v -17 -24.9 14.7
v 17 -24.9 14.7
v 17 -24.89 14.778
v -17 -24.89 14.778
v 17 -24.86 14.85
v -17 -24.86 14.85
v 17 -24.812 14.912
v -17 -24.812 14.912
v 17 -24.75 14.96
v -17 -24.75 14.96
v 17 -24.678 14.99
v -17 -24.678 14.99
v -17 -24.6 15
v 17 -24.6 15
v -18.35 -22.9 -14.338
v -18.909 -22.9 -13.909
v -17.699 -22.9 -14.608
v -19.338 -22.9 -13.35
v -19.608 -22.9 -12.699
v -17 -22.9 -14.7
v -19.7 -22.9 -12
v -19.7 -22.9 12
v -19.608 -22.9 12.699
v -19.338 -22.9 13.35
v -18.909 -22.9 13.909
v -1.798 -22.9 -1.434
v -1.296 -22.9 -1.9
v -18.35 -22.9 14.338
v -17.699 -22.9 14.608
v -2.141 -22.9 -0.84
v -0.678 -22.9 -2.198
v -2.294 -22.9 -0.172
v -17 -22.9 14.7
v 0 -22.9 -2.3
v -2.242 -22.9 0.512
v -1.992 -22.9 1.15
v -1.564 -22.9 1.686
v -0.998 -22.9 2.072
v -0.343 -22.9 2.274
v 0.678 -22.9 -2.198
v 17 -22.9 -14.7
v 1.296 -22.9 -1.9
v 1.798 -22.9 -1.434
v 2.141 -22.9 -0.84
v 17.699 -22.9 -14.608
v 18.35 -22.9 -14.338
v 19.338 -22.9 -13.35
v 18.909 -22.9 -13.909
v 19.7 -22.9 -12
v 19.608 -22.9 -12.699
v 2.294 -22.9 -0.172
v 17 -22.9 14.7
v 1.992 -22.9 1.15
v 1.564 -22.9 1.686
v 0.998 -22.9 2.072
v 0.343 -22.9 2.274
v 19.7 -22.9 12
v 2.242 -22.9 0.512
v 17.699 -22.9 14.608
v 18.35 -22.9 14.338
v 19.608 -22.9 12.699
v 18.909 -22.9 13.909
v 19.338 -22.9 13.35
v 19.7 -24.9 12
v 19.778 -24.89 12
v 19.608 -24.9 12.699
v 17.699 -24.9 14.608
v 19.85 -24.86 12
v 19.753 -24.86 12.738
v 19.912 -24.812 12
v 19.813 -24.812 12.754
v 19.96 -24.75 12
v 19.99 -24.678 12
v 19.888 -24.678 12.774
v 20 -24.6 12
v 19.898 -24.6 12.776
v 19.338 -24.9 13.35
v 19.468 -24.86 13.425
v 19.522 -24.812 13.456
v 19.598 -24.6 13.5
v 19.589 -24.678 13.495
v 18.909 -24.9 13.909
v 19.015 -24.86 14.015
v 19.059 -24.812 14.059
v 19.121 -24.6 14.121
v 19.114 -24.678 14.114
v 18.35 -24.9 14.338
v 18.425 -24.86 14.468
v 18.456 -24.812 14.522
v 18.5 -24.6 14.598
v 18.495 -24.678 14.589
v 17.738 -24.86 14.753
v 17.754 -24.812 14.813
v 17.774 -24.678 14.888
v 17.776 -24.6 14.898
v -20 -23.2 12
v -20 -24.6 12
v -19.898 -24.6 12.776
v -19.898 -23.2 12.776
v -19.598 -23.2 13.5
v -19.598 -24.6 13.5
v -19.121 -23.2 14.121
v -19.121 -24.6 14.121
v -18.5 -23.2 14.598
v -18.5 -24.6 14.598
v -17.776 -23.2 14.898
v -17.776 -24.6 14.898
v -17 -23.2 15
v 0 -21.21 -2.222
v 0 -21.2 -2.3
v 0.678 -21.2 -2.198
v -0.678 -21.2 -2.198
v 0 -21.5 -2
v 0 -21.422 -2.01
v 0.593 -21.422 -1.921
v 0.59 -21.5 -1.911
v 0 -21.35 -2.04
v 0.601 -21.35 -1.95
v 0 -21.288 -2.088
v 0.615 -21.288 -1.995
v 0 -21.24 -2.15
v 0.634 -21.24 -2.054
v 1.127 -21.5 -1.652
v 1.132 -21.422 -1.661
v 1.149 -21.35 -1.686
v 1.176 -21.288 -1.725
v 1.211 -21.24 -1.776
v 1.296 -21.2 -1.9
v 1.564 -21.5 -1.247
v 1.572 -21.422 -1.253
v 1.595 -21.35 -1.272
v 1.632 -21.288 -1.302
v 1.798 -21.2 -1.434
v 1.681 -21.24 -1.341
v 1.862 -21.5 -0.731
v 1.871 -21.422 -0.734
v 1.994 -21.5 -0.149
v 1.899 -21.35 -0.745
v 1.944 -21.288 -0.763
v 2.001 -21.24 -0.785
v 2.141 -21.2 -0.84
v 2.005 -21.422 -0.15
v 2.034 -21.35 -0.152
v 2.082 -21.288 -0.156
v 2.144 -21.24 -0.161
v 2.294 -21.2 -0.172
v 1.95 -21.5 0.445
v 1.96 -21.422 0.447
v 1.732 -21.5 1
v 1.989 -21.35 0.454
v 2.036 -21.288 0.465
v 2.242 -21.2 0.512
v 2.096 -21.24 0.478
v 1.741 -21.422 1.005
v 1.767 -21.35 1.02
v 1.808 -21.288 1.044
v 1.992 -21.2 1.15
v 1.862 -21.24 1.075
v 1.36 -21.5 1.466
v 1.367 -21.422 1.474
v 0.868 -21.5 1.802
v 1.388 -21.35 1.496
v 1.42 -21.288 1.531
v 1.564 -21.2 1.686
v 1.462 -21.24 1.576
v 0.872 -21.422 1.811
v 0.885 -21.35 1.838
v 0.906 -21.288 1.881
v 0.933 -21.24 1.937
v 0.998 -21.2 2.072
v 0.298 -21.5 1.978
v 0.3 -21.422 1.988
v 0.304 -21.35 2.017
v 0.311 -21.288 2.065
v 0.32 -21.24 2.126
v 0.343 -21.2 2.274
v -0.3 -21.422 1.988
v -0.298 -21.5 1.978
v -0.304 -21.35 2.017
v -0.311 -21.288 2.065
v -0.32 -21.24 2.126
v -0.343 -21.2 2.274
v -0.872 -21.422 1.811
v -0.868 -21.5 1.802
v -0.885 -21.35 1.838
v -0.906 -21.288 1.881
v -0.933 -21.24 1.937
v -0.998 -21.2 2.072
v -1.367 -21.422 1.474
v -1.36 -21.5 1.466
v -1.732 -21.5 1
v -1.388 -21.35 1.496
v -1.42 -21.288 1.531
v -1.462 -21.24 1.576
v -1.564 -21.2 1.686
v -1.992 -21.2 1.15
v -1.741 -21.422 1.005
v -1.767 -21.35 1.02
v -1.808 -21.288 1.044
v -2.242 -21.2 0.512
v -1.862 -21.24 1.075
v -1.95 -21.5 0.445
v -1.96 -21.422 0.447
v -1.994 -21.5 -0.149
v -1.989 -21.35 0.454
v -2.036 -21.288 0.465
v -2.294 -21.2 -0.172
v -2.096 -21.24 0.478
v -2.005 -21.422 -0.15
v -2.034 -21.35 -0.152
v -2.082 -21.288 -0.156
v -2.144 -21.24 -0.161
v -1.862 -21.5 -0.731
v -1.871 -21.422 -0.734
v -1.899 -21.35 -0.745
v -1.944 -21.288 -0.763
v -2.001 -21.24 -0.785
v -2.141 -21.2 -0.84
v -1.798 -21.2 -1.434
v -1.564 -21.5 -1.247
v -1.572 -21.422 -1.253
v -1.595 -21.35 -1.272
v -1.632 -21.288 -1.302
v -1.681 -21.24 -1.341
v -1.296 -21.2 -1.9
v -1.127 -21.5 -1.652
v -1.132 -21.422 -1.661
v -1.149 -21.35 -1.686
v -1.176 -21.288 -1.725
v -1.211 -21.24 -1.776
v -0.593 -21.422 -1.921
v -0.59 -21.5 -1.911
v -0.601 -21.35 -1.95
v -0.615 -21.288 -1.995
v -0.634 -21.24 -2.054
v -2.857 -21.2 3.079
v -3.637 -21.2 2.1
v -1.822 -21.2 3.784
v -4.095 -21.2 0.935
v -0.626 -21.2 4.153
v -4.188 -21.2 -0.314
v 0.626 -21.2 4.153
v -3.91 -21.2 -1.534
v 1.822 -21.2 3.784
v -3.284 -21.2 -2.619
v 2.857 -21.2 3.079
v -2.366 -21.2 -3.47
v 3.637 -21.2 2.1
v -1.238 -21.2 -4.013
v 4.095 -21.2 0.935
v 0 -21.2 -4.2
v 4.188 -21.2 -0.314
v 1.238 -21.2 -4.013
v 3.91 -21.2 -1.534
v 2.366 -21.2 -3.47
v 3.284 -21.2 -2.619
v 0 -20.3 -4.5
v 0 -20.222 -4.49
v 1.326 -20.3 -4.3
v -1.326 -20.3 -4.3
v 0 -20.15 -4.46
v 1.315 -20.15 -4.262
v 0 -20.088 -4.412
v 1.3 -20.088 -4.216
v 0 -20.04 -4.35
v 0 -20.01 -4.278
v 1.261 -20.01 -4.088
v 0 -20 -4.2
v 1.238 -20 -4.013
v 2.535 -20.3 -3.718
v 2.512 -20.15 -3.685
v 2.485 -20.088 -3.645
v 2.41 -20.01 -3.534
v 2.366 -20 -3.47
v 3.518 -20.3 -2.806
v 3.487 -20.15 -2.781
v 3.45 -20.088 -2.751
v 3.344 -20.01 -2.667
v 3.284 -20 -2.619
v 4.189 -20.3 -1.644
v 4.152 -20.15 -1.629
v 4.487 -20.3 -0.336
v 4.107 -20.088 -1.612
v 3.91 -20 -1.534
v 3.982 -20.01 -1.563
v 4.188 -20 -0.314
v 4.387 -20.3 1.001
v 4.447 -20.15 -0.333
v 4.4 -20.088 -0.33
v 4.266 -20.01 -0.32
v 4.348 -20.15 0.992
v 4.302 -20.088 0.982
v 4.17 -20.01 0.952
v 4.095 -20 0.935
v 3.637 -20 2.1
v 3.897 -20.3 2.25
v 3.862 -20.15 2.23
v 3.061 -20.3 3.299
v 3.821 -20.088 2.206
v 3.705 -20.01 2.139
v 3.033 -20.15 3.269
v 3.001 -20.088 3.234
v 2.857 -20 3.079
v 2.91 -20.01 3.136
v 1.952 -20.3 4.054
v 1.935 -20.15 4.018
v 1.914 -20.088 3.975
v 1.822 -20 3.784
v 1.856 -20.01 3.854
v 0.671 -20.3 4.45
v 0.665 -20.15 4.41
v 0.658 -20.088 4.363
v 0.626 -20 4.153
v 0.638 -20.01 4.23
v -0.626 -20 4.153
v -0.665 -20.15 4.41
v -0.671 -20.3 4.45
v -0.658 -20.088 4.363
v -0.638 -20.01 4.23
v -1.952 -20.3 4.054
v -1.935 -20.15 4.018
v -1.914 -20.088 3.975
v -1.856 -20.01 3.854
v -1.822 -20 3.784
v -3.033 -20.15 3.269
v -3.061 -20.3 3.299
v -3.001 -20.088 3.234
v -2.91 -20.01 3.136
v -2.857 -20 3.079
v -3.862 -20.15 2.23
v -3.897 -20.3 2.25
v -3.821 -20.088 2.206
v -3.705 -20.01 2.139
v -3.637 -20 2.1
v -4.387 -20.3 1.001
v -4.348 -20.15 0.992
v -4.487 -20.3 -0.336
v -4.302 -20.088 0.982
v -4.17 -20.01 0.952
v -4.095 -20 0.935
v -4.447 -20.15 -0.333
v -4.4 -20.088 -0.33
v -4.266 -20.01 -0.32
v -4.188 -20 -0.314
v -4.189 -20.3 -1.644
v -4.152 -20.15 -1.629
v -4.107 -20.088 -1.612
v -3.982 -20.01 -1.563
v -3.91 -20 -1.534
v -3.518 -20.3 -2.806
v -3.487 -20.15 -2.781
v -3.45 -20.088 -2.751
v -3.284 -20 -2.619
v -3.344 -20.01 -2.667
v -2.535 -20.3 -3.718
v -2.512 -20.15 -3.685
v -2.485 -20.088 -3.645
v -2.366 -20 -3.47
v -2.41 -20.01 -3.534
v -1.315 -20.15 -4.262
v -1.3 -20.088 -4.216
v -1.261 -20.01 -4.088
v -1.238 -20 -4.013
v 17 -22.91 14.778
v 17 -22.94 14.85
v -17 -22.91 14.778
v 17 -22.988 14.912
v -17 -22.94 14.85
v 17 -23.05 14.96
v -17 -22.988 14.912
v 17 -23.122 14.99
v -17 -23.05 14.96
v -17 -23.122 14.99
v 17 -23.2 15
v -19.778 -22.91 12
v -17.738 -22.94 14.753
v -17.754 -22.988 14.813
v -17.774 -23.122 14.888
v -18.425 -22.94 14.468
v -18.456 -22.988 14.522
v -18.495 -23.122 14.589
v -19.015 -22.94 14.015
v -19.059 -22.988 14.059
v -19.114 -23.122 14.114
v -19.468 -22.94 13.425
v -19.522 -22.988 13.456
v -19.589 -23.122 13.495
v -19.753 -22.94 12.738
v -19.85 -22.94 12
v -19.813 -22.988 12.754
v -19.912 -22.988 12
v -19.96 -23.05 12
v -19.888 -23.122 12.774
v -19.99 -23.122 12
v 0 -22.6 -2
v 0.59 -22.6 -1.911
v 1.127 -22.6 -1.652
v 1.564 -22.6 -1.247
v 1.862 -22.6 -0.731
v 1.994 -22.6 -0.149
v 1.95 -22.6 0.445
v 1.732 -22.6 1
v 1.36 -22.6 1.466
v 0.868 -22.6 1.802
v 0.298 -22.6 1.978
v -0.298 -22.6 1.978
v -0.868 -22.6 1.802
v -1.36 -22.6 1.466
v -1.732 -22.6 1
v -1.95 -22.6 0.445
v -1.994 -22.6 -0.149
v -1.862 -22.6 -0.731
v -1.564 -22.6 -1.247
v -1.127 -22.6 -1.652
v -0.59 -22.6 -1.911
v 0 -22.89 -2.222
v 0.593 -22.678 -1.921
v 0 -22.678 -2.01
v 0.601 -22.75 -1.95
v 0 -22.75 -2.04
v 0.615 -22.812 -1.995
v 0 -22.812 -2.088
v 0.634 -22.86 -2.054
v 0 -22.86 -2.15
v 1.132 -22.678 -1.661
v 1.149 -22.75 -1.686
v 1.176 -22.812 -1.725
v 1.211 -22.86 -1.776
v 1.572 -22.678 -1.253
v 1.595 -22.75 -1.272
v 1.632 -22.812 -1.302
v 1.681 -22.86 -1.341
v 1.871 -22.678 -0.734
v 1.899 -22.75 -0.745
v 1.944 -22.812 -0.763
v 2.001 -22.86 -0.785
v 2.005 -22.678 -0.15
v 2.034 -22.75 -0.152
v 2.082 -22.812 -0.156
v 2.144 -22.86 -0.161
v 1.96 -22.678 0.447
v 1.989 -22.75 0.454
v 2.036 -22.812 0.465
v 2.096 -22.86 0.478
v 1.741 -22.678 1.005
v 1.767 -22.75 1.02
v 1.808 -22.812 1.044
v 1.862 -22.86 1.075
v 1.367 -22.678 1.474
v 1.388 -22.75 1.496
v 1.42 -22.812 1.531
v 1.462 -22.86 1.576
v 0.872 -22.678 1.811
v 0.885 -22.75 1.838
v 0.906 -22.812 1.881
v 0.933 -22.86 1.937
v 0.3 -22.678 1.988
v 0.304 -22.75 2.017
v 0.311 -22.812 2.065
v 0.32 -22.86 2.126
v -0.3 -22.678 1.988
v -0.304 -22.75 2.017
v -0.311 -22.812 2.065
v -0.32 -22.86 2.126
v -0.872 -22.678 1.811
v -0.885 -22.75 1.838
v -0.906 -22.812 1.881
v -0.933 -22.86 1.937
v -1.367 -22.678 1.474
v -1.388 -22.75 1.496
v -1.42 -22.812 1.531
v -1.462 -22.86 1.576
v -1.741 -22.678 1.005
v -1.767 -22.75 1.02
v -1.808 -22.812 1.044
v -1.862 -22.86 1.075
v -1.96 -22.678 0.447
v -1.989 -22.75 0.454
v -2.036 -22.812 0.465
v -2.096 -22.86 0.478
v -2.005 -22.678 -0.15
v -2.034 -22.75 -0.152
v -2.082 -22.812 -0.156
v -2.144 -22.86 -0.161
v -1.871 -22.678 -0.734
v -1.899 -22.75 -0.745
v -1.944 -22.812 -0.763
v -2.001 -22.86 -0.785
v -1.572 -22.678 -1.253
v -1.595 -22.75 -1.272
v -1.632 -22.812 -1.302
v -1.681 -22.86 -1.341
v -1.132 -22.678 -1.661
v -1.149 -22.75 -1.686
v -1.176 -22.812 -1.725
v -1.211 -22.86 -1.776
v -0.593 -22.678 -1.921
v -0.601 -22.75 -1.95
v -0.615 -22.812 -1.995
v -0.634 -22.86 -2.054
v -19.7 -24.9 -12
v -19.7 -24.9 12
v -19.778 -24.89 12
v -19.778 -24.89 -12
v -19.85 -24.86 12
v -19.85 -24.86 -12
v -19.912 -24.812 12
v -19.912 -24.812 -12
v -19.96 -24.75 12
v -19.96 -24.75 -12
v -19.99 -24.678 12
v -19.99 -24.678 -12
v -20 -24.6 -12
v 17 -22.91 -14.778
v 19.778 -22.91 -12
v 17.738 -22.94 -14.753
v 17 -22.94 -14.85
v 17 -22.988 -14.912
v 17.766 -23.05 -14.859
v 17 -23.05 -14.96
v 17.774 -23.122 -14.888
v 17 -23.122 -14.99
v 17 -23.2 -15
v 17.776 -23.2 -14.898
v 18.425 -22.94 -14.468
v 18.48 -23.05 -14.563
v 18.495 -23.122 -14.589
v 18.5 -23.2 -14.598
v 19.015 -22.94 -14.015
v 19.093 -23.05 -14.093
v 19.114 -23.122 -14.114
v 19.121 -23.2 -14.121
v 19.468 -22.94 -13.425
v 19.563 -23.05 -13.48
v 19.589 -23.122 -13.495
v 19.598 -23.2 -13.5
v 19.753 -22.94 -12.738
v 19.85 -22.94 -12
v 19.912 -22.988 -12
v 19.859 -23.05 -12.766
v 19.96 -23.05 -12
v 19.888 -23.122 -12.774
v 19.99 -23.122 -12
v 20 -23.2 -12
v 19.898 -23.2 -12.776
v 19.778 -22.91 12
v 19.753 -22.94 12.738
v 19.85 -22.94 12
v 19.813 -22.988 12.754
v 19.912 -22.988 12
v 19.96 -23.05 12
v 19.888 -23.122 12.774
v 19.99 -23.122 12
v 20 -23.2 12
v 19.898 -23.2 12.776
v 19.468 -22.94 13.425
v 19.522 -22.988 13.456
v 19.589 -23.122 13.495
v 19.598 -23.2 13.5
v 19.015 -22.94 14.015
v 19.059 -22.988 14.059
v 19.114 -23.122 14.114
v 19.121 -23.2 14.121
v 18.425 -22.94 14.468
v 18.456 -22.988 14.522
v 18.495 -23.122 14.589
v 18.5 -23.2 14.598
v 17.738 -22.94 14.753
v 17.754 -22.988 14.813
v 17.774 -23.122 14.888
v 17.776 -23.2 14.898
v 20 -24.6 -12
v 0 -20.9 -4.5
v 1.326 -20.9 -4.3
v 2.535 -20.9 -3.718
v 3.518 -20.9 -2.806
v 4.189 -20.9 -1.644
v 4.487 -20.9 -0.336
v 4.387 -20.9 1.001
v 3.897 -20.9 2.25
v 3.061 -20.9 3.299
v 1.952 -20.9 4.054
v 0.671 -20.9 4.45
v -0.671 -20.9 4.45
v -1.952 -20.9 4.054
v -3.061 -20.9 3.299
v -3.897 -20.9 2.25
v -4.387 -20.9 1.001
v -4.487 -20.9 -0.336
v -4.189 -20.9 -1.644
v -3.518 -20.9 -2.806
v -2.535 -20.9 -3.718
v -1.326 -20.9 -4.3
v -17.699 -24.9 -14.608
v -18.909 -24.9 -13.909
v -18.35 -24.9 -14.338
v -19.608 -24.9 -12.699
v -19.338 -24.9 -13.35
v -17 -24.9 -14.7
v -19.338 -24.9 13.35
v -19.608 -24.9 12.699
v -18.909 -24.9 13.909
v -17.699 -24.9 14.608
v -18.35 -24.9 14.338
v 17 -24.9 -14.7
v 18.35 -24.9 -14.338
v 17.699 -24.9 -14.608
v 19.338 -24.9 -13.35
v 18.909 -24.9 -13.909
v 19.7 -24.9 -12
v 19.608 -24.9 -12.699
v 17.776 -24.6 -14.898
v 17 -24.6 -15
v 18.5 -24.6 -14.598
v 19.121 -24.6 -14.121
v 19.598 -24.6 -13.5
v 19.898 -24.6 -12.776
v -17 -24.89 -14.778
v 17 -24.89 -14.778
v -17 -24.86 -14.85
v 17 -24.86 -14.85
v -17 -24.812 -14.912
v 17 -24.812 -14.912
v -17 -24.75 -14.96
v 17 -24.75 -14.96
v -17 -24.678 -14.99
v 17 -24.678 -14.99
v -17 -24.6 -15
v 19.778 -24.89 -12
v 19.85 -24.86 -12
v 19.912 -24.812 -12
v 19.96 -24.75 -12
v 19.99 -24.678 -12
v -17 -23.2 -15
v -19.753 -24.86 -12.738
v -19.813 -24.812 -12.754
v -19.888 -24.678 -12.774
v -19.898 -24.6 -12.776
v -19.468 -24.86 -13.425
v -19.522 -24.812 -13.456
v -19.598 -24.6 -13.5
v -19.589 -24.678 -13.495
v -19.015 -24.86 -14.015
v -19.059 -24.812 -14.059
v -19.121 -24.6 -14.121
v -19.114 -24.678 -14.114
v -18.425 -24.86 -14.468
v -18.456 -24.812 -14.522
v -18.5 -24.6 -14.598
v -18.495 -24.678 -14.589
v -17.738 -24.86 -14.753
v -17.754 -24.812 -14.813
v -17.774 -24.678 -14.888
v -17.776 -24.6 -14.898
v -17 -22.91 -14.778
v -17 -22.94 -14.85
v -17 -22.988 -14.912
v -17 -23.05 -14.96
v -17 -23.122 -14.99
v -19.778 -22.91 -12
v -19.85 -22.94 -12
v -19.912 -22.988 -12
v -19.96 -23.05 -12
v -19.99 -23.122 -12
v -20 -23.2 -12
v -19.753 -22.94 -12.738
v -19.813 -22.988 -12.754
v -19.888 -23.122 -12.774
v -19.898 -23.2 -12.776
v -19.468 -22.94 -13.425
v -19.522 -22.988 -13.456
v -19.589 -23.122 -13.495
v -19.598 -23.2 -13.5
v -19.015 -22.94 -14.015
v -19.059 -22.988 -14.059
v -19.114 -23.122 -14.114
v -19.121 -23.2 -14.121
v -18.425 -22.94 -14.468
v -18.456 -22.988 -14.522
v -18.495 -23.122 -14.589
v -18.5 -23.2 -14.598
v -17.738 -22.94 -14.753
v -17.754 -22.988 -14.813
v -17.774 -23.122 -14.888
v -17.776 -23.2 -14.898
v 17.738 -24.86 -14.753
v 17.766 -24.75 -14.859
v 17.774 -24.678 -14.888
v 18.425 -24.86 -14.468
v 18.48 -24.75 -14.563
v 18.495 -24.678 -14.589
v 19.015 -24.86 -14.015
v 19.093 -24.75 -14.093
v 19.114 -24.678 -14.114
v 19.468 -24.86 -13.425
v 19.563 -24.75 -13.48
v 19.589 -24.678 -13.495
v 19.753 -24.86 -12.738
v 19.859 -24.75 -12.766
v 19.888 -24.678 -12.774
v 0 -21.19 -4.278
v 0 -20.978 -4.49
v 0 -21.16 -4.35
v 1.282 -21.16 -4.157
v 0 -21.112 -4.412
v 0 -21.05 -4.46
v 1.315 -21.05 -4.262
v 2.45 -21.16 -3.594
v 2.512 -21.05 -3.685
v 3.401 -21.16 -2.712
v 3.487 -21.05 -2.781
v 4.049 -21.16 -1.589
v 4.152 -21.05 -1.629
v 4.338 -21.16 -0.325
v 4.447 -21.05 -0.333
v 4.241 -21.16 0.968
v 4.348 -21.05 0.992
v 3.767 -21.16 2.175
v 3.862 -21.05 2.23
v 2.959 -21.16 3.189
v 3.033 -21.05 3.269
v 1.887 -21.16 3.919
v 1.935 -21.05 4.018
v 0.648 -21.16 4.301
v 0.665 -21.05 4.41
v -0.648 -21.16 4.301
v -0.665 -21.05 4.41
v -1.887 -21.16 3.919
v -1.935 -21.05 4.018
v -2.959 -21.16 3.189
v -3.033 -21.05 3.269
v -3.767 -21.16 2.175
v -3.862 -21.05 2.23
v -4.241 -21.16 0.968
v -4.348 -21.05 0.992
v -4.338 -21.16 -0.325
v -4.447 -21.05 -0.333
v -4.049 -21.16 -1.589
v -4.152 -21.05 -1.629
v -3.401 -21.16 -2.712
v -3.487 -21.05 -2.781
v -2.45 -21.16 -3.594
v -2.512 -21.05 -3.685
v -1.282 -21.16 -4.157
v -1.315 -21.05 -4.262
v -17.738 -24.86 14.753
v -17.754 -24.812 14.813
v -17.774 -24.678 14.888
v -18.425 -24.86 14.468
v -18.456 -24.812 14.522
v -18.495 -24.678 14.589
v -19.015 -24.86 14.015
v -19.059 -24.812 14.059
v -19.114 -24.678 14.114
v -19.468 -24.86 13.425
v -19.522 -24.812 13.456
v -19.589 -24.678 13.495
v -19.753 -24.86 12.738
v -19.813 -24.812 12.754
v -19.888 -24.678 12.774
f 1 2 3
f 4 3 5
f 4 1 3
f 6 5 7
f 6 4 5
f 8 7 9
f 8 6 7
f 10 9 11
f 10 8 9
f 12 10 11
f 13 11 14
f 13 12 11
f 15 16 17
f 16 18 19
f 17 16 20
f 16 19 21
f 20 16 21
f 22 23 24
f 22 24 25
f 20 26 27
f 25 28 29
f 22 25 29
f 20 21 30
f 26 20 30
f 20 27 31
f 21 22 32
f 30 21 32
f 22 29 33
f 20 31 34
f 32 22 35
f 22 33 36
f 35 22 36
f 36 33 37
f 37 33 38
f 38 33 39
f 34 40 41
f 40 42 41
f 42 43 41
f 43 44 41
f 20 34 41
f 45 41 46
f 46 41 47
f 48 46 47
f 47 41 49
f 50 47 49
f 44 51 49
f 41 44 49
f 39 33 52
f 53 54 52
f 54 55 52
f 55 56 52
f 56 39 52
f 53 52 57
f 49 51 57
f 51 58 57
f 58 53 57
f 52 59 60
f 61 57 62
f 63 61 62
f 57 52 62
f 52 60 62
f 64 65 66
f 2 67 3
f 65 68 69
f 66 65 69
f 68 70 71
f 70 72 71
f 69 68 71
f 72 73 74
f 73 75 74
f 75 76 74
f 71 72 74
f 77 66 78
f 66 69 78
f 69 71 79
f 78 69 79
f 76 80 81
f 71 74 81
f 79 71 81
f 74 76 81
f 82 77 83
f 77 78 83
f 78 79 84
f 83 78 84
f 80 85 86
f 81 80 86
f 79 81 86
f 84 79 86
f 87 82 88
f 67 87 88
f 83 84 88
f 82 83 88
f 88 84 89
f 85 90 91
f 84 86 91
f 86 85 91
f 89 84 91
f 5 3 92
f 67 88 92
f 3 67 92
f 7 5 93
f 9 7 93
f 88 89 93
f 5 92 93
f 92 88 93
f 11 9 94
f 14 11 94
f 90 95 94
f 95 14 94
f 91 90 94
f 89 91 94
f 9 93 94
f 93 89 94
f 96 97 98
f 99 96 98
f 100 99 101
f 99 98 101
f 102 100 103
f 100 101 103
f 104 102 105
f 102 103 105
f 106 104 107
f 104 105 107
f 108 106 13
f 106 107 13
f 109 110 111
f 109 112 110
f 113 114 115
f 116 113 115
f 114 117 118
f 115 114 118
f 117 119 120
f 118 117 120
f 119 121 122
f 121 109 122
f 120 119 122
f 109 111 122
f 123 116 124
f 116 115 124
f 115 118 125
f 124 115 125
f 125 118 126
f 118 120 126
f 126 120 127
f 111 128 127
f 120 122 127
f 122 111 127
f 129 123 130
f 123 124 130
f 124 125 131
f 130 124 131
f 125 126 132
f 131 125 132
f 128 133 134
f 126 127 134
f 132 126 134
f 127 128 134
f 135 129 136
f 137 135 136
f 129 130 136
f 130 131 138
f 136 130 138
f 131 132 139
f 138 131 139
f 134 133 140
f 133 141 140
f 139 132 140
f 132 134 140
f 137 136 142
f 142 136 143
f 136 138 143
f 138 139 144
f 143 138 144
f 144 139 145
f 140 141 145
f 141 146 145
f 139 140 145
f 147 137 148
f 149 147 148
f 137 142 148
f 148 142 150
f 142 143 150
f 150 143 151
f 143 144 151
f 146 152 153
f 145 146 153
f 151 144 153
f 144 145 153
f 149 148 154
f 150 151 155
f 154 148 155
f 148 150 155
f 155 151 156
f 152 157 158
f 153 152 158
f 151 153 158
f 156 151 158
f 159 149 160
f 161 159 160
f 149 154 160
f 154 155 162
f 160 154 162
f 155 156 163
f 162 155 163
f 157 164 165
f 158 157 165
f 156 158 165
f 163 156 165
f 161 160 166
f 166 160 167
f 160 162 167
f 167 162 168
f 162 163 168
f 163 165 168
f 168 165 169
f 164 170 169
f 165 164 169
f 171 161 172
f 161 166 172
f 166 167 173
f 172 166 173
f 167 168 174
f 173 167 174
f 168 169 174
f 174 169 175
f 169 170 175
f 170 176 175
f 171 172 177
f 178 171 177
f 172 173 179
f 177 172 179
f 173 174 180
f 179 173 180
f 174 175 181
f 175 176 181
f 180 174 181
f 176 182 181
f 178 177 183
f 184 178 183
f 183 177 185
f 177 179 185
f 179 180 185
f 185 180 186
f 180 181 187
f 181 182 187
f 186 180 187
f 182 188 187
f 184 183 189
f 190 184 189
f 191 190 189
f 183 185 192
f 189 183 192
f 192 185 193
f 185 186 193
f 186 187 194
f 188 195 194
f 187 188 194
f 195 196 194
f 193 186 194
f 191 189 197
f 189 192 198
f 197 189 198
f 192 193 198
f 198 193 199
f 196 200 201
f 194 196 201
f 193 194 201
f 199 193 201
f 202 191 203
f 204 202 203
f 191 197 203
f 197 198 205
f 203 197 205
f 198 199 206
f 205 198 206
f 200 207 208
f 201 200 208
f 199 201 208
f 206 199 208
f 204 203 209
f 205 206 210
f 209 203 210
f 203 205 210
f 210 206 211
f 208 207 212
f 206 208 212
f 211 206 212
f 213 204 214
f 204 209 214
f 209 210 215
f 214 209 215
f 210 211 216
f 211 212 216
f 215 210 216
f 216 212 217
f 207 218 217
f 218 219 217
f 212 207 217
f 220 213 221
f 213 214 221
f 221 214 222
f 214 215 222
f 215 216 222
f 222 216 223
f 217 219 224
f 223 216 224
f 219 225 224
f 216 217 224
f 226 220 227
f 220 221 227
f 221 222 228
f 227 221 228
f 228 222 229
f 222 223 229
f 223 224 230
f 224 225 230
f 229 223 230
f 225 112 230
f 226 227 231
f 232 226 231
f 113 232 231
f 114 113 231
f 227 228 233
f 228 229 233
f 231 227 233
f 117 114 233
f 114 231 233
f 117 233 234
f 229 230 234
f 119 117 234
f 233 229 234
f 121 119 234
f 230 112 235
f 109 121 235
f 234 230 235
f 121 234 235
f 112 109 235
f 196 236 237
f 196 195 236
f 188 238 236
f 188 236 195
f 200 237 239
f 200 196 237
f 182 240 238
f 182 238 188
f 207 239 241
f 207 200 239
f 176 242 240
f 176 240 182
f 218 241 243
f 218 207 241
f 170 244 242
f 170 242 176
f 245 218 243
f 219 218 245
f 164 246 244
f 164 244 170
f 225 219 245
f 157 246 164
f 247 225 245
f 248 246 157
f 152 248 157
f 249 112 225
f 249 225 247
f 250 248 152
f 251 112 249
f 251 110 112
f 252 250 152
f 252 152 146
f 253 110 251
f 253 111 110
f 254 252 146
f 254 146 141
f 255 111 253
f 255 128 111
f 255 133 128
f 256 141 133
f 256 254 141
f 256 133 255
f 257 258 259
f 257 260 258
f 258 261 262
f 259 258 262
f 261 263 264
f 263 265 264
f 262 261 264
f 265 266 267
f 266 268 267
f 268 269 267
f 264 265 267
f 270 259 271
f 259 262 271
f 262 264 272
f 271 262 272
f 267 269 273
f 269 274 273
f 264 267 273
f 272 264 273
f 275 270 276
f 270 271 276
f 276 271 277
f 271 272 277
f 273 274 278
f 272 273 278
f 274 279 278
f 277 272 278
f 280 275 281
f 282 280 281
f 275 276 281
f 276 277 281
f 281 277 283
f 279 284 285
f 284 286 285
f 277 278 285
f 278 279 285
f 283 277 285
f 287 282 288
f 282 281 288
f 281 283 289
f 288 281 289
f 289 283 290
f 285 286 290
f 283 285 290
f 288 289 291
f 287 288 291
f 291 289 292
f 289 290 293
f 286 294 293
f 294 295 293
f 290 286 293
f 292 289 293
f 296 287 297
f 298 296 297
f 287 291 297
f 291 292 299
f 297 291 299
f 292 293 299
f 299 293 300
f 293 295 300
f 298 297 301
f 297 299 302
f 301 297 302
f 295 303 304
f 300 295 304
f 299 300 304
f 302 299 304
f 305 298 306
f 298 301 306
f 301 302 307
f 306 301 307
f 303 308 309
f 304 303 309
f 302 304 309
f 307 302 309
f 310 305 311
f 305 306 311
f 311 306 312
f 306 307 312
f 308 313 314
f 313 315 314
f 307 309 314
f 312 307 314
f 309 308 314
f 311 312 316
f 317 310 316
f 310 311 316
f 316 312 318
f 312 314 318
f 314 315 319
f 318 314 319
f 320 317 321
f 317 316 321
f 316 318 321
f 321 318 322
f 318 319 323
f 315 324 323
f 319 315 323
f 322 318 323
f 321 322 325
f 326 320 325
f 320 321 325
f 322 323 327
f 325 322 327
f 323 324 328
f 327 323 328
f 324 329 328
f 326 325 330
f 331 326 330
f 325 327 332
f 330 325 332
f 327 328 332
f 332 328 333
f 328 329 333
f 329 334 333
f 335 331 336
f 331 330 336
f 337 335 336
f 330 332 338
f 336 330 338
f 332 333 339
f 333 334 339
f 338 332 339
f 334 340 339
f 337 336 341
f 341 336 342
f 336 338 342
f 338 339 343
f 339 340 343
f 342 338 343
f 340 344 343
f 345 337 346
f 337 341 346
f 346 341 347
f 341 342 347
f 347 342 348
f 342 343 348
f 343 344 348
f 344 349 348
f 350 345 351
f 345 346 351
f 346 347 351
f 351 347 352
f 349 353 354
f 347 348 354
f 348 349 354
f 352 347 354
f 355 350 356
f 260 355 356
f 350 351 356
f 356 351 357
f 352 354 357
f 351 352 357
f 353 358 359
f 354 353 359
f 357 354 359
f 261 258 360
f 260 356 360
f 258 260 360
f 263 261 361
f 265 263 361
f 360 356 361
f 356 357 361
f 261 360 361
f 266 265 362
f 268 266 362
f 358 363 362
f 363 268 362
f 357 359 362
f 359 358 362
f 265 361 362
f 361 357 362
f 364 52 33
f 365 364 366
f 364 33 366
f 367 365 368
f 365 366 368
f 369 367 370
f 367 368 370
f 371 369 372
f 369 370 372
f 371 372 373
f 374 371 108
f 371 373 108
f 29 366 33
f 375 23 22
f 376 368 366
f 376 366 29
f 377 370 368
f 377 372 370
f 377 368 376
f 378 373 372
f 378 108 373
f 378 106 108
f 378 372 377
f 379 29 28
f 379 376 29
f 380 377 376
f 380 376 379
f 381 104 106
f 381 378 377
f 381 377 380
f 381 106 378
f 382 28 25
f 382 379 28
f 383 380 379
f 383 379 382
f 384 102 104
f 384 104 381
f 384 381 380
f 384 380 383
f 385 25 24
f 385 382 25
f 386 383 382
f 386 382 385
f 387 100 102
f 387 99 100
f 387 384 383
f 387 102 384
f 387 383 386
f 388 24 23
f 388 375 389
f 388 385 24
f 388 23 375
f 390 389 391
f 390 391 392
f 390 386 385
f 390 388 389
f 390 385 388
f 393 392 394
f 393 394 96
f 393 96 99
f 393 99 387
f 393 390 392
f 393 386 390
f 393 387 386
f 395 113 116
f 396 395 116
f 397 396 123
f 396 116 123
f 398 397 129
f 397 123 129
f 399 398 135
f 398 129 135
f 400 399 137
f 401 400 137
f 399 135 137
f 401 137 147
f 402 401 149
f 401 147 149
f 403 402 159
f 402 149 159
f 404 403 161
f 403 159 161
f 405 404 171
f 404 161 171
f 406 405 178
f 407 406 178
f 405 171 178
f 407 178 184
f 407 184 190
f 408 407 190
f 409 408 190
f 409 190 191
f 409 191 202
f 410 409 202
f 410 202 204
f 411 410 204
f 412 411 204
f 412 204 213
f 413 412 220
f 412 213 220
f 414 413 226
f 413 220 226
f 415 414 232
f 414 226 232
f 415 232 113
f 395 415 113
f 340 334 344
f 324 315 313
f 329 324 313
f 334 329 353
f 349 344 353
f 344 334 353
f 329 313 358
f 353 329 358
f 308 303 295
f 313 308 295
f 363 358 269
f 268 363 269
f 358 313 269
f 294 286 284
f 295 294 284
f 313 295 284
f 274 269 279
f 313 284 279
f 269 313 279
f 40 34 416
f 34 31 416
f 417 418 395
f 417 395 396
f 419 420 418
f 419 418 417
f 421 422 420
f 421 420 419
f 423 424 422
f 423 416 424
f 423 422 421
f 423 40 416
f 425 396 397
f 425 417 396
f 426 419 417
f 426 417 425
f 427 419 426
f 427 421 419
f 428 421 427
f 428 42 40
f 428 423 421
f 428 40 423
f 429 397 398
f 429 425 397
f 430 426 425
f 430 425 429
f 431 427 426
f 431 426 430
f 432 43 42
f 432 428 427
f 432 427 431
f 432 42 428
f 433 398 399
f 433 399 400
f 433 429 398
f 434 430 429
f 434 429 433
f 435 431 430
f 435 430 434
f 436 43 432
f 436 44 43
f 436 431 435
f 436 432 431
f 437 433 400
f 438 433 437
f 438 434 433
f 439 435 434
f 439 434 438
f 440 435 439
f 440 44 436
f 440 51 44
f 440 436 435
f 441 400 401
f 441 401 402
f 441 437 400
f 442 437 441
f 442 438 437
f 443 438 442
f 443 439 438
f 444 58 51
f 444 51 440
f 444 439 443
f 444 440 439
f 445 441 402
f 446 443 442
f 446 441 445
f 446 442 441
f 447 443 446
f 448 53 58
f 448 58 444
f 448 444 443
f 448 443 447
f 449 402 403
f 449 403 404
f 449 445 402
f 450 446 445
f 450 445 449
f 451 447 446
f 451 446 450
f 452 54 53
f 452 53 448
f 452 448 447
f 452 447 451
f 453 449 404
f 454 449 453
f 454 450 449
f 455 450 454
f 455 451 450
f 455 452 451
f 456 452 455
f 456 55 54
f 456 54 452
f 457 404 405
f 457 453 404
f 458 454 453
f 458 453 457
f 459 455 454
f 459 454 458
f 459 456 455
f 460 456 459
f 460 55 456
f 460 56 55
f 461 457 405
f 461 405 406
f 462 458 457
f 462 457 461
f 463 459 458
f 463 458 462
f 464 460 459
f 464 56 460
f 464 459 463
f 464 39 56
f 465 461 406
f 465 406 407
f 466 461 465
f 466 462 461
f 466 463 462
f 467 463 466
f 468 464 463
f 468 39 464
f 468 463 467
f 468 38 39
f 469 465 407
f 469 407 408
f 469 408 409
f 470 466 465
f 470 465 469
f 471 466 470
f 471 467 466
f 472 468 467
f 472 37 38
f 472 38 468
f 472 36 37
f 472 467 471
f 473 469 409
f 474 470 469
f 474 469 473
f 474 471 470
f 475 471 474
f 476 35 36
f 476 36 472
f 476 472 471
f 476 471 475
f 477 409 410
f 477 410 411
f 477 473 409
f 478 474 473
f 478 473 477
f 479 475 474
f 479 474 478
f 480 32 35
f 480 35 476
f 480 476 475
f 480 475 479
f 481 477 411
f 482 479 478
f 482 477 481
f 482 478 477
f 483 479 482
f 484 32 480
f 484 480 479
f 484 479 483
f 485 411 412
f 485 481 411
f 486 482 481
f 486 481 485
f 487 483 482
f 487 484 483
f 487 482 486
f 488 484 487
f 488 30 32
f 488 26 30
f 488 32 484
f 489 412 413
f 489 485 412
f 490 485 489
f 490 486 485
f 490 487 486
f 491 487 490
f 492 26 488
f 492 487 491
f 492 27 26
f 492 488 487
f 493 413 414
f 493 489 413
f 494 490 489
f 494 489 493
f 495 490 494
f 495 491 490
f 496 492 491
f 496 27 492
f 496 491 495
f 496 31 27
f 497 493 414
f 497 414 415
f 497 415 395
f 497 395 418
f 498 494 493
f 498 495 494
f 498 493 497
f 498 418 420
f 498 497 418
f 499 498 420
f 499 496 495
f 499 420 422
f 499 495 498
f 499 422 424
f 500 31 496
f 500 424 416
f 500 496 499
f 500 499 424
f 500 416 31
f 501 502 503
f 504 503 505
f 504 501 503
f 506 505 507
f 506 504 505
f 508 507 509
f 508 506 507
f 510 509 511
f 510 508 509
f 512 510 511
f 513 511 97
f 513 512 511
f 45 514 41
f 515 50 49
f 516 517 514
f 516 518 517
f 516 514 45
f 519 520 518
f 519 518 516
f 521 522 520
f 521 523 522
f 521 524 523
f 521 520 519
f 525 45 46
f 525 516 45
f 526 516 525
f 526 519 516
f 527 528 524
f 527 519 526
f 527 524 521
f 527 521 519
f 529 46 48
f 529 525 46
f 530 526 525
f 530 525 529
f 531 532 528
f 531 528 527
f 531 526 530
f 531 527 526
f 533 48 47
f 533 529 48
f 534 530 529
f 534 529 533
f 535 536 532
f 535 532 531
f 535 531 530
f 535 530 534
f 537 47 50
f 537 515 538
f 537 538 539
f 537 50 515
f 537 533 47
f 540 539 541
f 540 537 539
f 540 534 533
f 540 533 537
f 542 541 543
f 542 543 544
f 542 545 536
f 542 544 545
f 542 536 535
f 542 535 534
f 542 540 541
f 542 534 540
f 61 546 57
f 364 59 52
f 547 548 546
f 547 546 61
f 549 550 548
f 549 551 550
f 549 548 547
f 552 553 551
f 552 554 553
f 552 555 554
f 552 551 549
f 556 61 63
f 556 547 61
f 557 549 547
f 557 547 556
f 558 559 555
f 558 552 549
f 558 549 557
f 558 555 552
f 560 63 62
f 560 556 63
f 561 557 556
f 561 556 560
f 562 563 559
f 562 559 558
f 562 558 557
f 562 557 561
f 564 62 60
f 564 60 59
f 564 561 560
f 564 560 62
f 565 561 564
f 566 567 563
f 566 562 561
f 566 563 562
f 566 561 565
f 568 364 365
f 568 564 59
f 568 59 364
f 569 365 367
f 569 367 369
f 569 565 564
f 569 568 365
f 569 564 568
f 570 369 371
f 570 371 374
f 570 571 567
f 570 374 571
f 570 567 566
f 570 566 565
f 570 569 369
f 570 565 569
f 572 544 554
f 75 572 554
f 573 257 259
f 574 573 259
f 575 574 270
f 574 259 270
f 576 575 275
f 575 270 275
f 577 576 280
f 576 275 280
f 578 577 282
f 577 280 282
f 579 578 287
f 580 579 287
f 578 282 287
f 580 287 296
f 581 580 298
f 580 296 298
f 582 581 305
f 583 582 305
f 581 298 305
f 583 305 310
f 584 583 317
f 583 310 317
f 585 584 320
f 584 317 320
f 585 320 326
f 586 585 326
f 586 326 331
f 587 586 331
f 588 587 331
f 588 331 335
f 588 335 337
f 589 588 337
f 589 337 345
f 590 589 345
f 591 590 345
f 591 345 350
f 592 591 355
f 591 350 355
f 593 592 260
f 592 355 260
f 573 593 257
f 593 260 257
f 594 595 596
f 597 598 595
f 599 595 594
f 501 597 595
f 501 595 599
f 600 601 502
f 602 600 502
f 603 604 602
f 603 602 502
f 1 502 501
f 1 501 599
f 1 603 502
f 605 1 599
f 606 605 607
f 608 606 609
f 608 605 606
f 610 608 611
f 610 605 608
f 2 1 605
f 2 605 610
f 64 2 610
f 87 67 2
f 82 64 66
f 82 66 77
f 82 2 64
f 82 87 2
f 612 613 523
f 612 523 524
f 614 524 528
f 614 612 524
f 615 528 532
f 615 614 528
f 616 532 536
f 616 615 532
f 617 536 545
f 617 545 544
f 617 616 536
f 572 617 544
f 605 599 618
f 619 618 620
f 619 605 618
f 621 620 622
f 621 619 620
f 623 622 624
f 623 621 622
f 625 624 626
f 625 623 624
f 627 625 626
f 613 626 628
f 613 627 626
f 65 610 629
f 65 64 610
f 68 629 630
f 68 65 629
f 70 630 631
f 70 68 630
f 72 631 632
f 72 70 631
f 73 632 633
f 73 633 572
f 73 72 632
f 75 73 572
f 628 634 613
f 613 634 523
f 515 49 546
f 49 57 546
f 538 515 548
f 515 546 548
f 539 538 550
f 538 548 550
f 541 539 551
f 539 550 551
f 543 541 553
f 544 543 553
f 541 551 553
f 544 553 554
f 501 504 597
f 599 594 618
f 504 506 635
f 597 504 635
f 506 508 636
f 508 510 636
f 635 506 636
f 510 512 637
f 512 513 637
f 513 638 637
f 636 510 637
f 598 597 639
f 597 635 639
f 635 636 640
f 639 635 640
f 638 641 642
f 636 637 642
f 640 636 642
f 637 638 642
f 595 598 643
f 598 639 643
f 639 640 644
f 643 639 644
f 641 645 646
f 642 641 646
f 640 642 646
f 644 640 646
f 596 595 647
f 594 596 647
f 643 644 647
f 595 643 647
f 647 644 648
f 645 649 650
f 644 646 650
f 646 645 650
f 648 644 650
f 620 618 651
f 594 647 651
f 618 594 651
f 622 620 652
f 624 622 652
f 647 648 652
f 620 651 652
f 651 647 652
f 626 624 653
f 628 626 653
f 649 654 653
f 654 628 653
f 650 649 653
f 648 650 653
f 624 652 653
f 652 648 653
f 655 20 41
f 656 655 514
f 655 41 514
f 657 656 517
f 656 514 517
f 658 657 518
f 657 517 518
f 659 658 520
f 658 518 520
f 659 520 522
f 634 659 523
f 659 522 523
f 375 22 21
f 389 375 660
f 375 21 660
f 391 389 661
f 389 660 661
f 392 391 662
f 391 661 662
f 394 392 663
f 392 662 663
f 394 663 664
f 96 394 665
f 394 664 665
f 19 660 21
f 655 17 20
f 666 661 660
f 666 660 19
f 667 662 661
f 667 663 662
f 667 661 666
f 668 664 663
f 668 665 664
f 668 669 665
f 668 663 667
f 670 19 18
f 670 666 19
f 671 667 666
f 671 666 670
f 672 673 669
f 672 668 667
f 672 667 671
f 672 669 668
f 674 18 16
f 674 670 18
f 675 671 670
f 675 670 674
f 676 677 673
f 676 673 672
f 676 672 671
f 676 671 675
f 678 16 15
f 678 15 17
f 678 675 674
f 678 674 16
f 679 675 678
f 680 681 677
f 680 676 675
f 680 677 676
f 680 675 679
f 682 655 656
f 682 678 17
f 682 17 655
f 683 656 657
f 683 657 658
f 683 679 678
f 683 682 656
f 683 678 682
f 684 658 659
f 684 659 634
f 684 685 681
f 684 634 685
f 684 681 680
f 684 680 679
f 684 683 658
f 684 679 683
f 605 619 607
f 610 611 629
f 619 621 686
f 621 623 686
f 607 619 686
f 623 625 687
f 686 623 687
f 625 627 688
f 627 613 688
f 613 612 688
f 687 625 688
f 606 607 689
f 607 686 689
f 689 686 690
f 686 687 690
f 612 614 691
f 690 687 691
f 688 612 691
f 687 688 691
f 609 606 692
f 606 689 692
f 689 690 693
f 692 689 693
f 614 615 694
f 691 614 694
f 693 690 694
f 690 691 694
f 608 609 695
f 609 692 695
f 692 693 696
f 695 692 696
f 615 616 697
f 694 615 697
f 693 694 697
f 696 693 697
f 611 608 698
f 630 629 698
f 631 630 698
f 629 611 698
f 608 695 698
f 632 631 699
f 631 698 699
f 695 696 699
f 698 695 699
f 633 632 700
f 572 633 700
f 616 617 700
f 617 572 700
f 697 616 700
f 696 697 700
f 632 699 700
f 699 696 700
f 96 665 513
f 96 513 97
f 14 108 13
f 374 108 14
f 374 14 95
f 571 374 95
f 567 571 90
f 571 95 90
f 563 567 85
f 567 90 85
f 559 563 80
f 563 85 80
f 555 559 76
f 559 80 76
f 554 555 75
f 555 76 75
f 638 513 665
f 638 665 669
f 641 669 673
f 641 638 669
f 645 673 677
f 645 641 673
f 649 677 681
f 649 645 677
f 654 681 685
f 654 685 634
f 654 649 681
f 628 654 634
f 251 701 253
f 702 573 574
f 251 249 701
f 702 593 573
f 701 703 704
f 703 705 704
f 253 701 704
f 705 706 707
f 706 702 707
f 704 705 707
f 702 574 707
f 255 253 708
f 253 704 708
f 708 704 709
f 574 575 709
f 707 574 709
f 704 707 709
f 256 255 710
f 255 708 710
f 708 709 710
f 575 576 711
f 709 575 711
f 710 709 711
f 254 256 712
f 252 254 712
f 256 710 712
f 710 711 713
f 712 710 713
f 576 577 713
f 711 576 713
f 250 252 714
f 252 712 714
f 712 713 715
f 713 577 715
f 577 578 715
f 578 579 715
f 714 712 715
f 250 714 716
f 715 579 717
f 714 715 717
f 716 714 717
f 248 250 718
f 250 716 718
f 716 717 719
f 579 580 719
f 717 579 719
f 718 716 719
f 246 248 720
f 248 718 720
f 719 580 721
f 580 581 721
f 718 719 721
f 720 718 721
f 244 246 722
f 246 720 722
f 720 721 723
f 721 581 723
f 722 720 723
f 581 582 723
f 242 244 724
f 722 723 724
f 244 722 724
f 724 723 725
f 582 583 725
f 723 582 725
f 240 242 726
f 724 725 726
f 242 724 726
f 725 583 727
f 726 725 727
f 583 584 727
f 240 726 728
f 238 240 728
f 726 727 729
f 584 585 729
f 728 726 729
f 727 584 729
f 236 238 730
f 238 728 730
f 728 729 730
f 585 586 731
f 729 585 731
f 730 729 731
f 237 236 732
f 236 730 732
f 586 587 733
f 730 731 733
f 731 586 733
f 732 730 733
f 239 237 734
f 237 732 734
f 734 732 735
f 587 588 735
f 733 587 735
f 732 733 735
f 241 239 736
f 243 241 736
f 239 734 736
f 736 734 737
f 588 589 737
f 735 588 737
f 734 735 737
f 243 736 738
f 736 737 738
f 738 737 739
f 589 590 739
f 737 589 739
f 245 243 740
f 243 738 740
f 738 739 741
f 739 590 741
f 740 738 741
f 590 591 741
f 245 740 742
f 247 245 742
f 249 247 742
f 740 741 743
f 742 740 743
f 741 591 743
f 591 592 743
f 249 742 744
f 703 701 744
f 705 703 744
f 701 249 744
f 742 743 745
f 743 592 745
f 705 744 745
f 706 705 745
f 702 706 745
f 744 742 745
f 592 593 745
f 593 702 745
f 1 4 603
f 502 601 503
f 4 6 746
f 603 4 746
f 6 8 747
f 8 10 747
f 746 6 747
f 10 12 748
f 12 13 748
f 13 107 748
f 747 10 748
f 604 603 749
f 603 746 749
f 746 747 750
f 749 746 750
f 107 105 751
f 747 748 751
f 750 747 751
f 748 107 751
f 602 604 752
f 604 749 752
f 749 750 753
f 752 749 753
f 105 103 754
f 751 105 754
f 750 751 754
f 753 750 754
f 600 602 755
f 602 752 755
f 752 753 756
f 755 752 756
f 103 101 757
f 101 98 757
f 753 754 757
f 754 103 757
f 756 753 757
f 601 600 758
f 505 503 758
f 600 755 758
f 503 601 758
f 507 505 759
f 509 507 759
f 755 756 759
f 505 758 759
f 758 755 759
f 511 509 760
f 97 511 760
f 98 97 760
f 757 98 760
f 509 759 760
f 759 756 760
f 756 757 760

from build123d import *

# Parameters (mm, degrees)
SKETCH1_R           = 4.5
BOSS_EXTRUDE1_DEPTH = 1.2
SKETCH2_R           = 2
BOSS_EXTRUDE2_DEPTH = 1.7
SKETCH4_W           = 40
SKETCH4_H           = 30
BOSS_EXTRUDE3_DEPTH = 2
FILLET1_R           = 3
FILLET2_R           = 0.3
FILLET3_R           = 0.3
FILLET4_R           = 0.3
FILLET5_R           = 0.3
FILLET6_R           = 0.3
FILLET7_R           = 0.3


with BuildPart() as part:
    # Sketch1 → Boss-Extrude1 (new body)
    with BuildSketch(Plane.XZ.offset(20)):
        with Locations(Location((0, 0, 0), (0, 0, 270))):
            Circle(SKETCH1_R)
    extrude(amount=BOSS_EXTRUDE1_DEPTH)

    # Sketch2 → Boss-Extrude2 (add)
    with BuildSketch(Plane.XZ.offset(21.2)):
        with Locations(Location((0, 0, 0), (0, 0, 270))):
            Circle(SKETCH2_R)
    extrude(amount=BOSS_EXTRUDE2_DEPTH)

    # Sketch4 → Boss-Extrude3 (add)
    with BuildSketch(Plane.XZ.offset(22.9)):
        Rectangle(SKETCH4_W, SKETCH4_H)
    extrude(amount=BOSS_EXTRUDE3_DEPTH)

    # Fillet1
    fillet1_edges = [part.edges().sort_by_distance(p)[0] for p in [
        (-20, -23.9, -15),
        (20, -23.9, -15),
        (20, -23.9, 15),
        (-20, -23.9, 15),
    ]]
    fillet(fillet1_edges, radius=FILLET1_R)

    # Fillet2
    fillet2_edges = [part.edges().sort_by_distance(p)[0] for p in [
        (20, -24.9, 0),
        (0, -24.9, -15),
        (-20, -24.9, 0),
        (0, -24.9, 15),
        (-19.121320344, -24.9, -14.121320344),
        (-19.121320344, -24.9, 14.121320344),
        (19.121320344, -24.9, 14.121320344),
        (19.121320344, -24.9, -14.121320344),
    ]]
    fillet(fillet2_edges, radius=FILLET2_R)

    # Fillet3
    fillet3_edges = [part.edges().sort_by_distance(p)[0] for p in [
        (20, -22.9, 0),
        (-20, -22.9, 0),
        (0, -22.9, 15),
        (0, -22.9, -15),
        (-19.121320344, -22.9, -14.121320344),
        (-19.121320344, -22.9, 14.121320344),
        (19.121320344, -22.9, 14.121320344),
        (19.121320344, -22.9, -14.121320344),
    ]]
    fillet(fillet3_edges, radius=FILLET3_R)

    # Fillet4
    fillet4_edges = [part.edges().sort_by_distance(p)[0] for p in [
        (0, -21.2, 4.5),
    ]]
    fillet(fillet4_edges, radius=FILLET4_R)

    # Fillet5
    fillet5_edges = [part.edges().sort_by_distance(p)[0] for p in [
        (0, -20, 4.5),
    ]]
    fillet(fillet5_edges, radius=FILLET5_R)

    # Fillet6
    fillet6_edges = [part.edges().sort_by_distance(p)[0] for p in [
        (0, -22.9, 2),
    ]]
    fillet(fillet6_edges, radius=FILLET6_R)

    # Fillet7
    fillet7_edges = [part.edges().sort_by_distance(p)[0] for p in [
        (0, -21.2, 2),
    ]]
    fillet(fillet7_edges, radius=FILLET7_R)


solid = part.part
